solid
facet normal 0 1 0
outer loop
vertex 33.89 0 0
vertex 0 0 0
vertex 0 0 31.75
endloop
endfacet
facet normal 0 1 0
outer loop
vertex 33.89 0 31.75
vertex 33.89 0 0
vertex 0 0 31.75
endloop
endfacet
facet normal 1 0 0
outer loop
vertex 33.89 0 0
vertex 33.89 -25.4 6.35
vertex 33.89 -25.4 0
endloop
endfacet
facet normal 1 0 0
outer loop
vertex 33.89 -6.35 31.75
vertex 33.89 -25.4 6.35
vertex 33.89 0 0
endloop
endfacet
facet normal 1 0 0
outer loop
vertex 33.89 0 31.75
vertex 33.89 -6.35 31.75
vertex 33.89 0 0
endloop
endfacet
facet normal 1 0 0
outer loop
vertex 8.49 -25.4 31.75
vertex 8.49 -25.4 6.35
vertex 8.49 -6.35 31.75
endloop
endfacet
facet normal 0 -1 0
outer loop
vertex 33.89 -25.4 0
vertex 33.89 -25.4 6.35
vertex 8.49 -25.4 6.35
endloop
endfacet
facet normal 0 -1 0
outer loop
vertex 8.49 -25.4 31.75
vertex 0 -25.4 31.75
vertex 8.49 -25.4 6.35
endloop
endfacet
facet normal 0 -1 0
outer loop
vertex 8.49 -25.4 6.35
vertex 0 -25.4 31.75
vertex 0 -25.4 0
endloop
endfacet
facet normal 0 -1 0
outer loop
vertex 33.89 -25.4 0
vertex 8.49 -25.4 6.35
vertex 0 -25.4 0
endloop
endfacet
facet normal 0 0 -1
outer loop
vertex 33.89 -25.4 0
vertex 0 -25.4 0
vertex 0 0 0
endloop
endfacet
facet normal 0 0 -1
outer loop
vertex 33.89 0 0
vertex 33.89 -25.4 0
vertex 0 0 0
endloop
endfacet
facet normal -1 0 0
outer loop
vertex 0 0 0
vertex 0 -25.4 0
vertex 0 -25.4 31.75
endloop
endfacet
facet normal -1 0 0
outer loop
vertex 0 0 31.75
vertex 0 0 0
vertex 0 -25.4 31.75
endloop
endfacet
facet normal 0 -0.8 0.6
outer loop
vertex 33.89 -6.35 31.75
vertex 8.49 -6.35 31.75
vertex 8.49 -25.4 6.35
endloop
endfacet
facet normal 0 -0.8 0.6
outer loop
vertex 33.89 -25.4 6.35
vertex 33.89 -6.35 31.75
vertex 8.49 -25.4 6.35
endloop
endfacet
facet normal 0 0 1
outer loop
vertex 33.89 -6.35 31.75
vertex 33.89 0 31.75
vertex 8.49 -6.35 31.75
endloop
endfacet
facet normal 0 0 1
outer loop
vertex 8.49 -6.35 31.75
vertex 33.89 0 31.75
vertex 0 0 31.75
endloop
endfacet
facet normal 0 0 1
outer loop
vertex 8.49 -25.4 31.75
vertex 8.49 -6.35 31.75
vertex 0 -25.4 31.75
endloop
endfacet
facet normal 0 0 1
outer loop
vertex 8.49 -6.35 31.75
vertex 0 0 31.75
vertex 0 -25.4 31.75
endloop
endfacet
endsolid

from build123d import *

# Parameters (mm, degrees)
F0_W     = 38.1
F0_H     = 31.75
F1_DEPTH = 25.4
F3_DEPTH = 25.4
F6_W     = 29.6103259988
F6_H     = 31.75
F7_DEPTH = 25.4


# Not quite as in the source:
# - a feature of the source that left no trace in its solid (it failed there, or was rolled back) is left out


with BuildPart() as f1:
    # F0 (on Front) → F1 (new body)
    with BuildSketch(Plane.XZ):
        with Locations((-10.5603259988, 15.875)):
            Rectangle(F0_W, F0_H)
    extrude(amount=F1_DEPTH)

    # F2 (on face) → F3 (join)
    with BuildSketch(Plane.YZ.offset(8.4896740012)):
        Polygon((-6.35, 31.75), (-25.4, 6.35), (-25.4, 0), (0, 0), (0, 31.75), align=None)
    extrude(amount=F3_DEPTH)

    # F6 (on face) → F7 (cut)
    with BuildSketch(Plane.XZ.offset(25.4)):
        with Locations((-14.8051629994, 15.875)):
            Rectangle(F6_W, F6_H)
    extrude(amount=-F7_DEPTH, mode=Mode.SUBTRACT)


solid = f1.part
